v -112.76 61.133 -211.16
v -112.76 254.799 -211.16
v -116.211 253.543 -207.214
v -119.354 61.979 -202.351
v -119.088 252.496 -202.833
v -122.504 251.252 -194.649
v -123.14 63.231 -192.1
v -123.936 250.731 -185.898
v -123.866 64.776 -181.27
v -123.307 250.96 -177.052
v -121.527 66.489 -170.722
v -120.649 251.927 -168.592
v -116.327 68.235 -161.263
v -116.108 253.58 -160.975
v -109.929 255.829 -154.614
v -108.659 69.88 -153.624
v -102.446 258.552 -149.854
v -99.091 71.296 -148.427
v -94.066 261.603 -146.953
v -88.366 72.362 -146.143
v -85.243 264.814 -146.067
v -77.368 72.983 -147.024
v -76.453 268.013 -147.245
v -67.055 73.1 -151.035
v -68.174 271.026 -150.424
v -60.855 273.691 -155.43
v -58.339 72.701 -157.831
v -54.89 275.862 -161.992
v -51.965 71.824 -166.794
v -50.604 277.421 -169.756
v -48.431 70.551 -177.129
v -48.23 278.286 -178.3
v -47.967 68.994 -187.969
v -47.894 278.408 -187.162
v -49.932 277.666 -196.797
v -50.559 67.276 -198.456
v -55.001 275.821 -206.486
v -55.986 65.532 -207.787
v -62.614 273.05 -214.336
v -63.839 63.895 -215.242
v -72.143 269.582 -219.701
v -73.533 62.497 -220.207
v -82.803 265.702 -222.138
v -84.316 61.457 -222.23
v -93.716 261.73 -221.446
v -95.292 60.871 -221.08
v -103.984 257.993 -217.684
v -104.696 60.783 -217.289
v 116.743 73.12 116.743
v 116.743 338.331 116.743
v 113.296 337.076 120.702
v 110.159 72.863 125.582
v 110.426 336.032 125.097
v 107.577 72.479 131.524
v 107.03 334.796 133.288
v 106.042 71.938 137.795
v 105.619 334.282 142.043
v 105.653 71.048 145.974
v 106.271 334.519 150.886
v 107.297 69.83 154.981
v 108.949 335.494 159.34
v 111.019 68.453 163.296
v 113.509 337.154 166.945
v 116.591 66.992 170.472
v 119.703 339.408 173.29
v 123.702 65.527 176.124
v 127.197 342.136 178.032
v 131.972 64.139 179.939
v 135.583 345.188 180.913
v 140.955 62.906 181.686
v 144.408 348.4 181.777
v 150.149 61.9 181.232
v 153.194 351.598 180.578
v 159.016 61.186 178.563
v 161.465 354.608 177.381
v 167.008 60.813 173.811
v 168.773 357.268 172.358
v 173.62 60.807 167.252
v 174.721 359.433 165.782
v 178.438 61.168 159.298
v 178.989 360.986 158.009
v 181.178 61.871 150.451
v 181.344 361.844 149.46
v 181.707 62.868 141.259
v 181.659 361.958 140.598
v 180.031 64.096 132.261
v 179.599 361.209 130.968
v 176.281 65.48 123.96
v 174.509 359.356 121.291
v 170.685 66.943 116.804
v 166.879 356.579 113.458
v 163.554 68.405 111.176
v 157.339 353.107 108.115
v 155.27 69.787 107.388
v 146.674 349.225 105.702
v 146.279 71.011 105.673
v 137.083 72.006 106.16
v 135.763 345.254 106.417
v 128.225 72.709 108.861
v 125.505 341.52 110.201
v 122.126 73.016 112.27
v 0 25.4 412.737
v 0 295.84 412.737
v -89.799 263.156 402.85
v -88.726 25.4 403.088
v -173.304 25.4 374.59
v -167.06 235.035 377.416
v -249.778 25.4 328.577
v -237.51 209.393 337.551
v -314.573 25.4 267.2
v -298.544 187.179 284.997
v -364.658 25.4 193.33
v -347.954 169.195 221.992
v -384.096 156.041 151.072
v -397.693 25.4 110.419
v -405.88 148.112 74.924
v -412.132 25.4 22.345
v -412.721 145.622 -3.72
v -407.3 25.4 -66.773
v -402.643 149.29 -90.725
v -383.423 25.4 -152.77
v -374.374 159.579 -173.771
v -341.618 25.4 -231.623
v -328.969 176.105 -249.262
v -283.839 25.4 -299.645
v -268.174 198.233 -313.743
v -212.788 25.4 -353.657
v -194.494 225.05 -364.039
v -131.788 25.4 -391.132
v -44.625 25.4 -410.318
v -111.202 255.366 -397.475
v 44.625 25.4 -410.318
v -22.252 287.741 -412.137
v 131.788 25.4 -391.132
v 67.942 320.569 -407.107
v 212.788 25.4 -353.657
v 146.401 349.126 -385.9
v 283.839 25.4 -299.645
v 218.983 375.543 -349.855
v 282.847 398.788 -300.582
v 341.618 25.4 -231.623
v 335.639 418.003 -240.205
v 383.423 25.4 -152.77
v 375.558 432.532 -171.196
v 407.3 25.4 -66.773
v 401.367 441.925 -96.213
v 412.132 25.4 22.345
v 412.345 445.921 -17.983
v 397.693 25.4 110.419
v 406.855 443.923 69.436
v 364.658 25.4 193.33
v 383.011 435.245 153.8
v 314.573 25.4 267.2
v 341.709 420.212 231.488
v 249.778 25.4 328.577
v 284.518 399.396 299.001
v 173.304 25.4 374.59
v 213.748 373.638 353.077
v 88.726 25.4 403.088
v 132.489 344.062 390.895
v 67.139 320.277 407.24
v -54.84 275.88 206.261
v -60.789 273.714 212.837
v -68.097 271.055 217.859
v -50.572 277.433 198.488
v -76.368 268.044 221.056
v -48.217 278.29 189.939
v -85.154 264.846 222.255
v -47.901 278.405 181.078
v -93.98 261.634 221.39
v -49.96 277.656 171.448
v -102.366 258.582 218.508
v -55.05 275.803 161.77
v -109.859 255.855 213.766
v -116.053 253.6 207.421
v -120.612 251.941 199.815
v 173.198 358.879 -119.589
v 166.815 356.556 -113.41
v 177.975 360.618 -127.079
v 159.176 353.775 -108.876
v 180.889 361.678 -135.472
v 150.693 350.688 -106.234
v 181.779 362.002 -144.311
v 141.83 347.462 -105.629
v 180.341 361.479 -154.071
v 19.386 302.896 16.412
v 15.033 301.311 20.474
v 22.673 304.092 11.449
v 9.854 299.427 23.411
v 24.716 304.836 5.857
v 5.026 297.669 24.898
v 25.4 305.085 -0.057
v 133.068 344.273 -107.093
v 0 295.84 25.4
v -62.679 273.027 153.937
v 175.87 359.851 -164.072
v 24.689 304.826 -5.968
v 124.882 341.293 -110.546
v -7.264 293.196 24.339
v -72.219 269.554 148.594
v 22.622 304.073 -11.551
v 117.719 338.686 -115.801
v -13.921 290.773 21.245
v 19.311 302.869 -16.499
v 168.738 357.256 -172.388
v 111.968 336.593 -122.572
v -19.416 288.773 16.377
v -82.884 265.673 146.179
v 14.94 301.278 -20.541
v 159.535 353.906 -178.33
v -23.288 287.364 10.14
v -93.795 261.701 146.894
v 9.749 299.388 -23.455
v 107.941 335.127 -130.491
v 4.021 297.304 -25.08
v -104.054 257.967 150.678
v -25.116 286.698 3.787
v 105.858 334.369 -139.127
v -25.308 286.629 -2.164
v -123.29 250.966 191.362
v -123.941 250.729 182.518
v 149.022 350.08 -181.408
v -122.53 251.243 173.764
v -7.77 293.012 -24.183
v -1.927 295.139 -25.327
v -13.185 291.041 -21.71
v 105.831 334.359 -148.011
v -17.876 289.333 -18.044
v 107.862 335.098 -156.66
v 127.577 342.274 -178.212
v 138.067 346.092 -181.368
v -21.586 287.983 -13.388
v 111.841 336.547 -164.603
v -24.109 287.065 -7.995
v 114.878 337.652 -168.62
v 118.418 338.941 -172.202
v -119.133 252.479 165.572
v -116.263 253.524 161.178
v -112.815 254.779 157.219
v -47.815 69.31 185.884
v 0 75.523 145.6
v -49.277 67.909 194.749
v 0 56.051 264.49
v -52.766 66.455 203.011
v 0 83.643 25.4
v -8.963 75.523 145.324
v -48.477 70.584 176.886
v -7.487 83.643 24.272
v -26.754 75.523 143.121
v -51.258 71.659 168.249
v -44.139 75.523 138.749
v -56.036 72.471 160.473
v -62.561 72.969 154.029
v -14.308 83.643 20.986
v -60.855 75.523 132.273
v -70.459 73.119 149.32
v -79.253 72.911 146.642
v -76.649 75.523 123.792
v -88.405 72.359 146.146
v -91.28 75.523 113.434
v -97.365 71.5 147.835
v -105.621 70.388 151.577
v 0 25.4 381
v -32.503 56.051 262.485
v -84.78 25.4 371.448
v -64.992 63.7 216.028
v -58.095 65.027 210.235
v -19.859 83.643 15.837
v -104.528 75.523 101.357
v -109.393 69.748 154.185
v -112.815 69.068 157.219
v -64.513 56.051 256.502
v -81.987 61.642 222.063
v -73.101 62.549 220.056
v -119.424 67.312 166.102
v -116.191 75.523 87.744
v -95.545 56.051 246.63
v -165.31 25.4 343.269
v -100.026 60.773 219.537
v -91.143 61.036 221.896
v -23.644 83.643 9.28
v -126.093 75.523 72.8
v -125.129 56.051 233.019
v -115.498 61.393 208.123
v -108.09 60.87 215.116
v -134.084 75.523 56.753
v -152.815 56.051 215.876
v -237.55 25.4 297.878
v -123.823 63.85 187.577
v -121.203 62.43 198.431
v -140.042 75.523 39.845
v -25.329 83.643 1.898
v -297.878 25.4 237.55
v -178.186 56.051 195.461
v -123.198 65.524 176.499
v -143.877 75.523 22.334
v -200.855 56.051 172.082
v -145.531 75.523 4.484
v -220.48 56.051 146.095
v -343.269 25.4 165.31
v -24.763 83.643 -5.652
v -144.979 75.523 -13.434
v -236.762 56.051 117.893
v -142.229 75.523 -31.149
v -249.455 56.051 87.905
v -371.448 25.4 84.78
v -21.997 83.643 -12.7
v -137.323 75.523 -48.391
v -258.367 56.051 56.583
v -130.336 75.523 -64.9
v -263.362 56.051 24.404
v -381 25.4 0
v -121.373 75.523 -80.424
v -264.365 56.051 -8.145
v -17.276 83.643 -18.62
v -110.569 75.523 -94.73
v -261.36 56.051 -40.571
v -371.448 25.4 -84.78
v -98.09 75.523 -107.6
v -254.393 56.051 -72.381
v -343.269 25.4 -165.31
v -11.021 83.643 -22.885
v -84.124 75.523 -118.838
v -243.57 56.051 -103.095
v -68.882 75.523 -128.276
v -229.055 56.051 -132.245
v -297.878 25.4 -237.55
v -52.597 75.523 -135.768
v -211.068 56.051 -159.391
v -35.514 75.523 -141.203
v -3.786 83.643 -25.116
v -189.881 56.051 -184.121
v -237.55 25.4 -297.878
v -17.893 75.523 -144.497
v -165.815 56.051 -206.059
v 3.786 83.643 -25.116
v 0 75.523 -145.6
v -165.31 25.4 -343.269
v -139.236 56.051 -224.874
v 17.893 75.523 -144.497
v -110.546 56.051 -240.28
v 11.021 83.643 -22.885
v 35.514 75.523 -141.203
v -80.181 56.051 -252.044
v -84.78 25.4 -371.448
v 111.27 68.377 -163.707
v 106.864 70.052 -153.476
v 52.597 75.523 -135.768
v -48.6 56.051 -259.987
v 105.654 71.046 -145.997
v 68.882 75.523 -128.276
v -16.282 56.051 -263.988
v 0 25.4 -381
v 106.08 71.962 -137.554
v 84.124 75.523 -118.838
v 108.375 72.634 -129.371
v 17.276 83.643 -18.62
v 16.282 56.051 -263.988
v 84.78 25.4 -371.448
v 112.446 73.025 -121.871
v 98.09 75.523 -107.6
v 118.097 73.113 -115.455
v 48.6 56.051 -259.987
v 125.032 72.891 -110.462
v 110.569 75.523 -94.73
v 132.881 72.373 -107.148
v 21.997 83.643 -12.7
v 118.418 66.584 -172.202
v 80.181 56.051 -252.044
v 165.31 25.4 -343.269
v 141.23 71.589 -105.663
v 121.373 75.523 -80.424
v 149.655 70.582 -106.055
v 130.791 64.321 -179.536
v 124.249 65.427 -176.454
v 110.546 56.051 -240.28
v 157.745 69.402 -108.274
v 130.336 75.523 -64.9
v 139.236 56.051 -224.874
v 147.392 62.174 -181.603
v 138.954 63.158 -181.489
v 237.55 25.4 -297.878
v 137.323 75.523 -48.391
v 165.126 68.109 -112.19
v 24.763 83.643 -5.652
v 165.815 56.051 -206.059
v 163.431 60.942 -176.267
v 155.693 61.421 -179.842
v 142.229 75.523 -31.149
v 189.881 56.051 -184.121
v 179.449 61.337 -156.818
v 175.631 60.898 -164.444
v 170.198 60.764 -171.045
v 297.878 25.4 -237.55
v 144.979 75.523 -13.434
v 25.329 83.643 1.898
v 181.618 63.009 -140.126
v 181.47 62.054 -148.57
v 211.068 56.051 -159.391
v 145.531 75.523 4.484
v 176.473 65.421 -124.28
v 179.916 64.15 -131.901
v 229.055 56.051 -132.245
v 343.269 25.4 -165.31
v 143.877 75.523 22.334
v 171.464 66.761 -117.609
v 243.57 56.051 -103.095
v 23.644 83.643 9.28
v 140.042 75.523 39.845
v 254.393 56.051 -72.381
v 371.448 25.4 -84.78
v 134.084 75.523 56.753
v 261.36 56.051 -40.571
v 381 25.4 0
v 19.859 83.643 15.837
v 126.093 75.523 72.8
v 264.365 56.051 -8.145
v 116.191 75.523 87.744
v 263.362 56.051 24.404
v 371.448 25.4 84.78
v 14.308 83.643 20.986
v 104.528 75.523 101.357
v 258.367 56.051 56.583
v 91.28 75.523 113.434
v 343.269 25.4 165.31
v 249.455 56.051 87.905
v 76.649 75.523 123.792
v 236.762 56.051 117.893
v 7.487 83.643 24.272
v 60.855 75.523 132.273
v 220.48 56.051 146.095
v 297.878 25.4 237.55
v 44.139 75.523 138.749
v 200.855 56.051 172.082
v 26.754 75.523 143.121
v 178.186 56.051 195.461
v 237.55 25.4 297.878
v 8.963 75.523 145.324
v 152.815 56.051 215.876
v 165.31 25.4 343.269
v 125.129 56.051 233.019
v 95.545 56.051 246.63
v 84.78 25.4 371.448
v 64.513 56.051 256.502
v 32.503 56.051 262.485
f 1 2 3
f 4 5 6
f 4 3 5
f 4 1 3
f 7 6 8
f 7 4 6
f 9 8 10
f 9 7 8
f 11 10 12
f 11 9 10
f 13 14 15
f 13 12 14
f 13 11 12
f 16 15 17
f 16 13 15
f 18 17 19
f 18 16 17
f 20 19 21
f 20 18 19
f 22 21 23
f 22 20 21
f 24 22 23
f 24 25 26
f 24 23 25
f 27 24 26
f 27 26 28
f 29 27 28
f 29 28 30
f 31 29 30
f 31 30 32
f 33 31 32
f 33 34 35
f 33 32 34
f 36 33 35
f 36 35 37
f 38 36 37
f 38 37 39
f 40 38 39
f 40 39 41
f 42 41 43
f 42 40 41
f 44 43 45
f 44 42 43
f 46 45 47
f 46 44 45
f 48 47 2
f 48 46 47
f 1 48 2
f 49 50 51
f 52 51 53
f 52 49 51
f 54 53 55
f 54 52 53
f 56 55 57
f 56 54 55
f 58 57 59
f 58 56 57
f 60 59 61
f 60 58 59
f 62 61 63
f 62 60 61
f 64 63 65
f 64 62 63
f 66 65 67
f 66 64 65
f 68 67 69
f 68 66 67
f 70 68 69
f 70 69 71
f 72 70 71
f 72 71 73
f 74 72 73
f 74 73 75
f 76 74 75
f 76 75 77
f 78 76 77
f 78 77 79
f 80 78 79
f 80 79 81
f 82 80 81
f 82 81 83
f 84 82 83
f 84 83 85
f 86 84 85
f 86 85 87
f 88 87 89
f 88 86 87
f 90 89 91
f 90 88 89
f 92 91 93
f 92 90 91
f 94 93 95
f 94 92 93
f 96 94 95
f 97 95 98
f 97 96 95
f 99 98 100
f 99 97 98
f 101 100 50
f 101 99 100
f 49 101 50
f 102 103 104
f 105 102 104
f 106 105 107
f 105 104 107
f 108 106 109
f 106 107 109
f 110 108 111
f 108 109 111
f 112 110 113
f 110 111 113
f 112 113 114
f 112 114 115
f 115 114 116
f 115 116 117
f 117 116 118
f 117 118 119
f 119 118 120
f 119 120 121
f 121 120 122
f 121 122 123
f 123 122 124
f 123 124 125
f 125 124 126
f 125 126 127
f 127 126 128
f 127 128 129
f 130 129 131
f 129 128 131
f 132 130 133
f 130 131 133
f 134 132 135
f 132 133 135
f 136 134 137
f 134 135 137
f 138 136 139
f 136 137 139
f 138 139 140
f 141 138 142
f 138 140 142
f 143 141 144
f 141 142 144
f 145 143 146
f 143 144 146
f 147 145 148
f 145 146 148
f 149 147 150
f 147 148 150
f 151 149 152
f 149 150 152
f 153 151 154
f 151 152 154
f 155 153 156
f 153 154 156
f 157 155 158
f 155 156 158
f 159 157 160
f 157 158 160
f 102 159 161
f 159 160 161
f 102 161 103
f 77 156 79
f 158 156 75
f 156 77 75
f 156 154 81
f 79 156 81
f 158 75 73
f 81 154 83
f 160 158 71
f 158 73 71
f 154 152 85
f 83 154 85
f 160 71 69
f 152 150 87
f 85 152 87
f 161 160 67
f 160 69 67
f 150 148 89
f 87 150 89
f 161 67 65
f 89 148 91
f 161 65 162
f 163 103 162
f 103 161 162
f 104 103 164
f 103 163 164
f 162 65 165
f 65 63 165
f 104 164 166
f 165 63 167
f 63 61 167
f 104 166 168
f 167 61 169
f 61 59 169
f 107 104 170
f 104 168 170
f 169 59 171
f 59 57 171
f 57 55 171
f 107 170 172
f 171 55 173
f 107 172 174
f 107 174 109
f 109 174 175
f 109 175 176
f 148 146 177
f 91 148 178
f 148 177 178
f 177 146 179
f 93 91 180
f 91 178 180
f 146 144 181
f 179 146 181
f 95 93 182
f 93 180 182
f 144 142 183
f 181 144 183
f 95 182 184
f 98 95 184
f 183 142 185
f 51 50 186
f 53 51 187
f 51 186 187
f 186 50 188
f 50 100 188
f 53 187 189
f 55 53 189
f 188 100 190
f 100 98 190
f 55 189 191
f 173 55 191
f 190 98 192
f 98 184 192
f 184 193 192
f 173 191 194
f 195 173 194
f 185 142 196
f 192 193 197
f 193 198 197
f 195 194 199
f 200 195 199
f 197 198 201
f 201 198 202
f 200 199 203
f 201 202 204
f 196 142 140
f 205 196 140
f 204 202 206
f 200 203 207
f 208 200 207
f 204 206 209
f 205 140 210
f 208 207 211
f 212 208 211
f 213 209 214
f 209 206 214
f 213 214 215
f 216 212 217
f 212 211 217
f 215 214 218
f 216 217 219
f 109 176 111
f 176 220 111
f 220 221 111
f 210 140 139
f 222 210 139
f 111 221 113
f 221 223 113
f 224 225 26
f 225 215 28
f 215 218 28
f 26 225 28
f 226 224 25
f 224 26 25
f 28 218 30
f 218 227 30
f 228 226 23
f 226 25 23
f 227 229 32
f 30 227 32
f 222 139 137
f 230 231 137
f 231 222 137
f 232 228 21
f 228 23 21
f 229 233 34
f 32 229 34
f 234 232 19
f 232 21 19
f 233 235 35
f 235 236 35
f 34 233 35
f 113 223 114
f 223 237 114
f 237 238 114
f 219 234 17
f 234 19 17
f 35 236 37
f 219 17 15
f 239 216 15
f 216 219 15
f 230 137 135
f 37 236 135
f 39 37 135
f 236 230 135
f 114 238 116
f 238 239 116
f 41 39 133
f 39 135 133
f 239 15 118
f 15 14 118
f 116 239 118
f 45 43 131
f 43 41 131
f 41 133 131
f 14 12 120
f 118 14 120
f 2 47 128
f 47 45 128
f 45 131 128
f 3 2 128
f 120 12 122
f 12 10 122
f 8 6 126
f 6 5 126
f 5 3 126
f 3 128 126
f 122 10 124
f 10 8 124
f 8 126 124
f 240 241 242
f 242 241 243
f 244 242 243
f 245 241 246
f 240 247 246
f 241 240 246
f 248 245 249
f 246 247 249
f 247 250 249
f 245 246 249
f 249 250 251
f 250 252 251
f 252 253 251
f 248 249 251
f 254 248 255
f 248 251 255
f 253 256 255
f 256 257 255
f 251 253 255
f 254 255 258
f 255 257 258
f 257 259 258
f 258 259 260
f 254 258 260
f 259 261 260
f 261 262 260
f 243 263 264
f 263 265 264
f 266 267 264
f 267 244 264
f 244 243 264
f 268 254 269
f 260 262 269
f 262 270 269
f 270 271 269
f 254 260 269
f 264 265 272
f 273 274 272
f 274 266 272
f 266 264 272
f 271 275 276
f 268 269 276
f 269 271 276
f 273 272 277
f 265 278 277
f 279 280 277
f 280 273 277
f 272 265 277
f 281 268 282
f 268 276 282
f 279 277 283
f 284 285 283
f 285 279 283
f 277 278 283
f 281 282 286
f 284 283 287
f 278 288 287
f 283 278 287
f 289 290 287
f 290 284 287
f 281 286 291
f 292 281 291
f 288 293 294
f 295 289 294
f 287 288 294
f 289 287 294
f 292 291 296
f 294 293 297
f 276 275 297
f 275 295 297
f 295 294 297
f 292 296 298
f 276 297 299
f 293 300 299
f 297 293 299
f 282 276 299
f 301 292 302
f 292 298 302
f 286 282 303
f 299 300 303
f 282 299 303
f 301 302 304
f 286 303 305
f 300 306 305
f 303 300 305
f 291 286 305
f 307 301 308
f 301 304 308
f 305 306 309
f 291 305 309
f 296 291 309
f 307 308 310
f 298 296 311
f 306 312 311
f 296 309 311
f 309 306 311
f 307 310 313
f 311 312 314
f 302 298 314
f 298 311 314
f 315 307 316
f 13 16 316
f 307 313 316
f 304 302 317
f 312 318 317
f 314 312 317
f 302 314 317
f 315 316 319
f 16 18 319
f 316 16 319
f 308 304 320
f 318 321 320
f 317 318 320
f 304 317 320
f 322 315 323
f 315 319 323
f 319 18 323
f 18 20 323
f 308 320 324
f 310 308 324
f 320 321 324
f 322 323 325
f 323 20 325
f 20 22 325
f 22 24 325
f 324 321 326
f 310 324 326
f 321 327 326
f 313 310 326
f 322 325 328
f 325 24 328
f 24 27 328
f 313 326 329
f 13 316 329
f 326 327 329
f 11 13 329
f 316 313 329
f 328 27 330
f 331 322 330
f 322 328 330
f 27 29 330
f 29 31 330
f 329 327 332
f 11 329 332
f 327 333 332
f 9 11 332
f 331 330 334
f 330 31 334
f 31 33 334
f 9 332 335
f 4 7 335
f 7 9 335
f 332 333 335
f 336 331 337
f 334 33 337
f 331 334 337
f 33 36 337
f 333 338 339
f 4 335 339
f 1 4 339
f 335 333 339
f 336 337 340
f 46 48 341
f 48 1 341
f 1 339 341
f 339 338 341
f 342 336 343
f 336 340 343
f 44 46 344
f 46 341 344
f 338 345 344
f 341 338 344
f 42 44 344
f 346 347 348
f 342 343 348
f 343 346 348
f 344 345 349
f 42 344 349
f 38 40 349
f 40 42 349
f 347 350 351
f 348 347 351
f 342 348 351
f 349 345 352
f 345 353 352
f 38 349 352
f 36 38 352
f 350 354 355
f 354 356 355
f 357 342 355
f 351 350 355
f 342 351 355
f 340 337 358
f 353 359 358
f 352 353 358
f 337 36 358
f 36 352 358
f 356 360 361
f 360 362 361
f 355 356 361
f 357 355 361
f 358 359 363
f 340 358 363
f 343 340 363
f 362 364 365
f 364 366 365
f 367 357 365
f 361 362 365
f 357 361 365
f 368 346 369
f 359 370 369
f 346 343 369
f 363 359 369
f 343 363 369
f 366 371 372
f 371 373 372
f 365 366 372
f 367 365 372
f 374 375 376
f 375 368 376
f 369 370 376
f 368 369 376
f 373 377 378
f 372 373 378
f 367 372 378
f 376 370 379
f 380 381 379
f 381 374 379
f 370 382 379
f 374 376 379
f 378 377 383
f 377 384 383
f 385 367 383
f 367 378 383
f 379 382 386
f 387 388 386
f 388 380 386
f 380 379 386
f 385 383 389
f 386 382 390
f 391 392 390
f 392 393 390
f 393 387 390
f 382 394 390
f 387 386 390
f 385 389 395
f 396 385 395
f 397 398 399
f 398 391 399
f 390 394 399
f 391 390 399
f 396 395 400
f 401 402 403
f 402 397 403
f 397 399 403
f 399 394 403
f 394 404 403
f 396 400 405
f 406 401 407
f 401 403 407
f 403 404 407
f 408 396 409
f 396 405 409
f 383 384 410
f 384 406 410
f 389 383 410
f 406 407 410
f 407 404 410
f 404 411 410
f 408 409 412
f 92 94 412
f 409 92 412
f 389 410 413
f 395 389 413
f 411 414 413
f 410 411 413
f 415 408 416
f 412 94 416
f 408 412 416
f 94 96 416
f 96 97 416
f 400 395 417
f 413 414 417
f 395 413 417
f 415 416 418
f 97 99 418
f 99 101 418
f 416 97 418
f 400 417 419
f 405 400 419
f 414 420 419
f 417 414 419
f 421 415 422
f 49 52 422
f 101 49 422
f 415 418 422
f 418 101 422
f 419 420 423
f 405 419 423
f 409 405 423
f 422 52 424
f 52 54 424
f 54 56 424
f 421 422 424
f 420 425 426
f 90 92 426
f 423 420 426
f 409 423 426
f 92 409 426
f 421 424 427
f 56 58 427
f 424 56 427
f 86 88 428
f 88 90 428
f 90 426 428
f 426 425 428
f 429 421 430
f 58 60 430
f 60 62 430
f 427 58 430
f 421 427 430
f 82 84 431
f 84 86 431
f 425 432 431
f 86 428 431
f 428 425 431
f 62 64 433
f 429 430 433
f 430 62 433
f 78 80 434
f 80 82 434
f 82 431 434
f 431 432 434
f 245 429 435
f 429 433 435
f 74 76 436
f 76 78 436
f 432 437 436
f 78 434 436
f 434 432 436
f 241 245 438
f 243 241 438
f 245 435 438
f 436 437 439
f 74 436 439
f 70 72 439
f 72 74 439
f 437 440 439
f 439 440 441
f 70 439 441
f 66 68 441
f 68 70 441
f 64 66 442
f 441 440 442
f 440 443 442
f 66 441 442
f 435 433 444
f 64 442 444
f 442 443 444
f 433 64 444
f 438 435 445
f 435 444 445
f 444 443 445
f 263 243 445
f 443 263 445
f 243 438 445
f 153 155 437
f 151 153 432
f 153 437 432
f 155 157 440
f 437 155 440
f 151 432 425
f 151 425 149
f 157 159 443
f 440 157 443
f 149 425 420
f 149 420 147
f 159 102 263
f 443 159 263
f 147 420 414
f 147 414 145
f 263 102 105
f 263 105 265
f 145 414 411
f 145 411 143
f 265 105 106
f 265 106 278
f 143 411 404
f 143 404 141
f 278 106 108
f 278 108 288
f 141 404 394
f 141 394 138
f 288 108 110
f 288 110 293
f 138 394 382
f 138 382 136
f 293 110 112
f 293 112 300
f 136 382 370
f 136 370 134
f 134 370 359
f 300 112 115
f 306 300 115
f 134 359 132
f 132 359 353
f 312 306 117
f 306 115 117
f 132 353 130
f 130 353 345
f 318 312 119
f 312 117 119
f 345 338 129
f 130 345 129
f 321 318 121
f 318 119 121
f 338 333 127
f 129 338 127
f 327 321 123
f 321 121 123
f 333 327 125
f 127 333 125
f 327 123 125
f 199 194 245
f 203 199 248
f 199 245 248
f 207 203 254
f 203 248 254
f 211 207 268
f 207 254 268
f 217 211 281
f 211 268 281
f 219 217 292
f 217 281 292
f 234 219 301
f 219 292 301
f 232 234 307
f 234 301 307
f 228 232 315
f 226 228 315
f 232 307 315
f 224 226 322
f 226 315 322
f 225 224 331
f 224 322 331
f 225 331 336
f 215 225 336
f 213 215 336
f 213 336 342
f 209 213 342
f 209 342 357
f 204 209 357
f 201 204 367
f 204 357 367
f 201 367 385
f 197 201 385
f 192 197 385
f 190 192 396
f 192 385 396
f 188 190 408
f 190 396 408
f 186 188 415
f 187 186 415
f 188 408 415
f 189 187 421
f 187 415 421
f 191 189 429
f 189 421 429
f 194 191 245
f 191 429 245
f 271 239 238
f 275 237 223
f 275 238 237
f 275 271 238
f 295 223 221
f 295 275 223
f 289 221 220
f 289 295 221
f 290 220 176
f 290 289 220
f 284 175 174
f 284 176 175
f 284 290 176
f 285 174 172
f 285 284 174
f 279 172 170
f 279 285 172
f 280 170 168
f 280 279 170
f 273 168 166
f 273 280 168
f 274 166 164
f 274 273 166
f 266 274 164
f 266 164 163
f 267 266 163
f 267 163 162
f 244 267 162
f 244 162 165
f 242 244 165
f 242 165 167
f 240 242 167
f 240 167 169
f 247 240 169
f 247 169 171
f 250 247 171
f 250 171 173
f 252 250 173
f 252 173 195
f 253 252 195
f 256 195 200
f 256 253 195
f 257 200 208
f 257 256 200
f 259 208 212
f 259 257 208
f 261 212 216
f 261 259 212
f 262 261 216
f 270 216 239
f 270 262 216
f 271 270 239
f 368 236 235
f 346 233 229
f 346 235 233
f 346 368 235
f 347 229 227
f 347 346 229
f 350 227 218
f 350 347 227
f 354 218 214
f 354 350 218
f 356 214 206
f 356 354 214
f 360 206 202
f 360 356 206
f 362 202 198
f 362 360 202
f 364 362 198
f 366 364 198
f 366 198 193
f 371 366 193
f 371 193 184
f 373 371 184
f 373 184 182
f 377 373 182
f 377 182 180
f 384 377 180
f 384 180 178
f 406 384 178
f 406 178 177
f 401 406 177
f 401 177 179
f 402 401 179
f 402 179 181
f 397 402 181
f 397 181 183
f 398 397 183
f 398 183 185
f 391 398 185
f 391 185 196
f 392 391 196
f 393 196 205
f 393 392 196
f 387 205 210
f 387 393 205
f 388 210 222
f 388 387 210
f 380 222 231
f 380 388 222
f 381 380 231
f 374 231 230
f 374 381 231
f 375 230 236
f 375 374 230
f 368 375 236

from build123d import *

# Parameters (mm, degrees)
CUT_EXTRUDE1_DEPTH      = 874.621652083
CUT_EXTRUDE1_DEPTH_BACK = 874.621652083
SKETCH6_R               = 38.1
SKETCH9_W               = 1605.930086896
SKETCH9_H               = 1331.723127606
CUT_EXTRUDE8_DEPTH      = 762.168569892


with BuildPart() as part:
    # Sketch4 → Revolve3 (revolve)
    with BuildSketch(Plane.XY):
        with BuildLine():
            Line((25.4, 650.00817936), (25.4, 83.643188795))
            ThreePointArc((25.4, 83.643188795), (205.276173143, 67.197534451), (381, 25.4))
            Line((381, 25.4), (412.7373, 25.4))
            Line((412.7373, 25.4), (412.7373, 488.95))
            Line((412.7373, 488.95), (411.1498, 488.95))
            Line((411.1498, 488.95), (411.1498, 514.35))
            ThreePointArc((411.1498, 514.35), (404.683813004, 537.626492136), (387.141395745, 554.23575674))
            ThreePointArc((387.141395745, 554.23575674), (211.762891066, 622.866495309), (25.4, 650.00817936))
        make_face()
    revolve(axis=Axis((0, 588.703209944, 0), (0, -1, 0)))

    # Sketch6 → Cut-Extrude1 (cut, two sides: drawn at the far end of the back side and taken through both)
    with BuildSketch(Plane(origin=(0, 0, 0), x_dir=(1, 0, 0), z_dir=(0, 1, 0)).offset(-CUT_EXTRUDE1_DEPTH_BACK)):
        with Locations((143.684097937, 143.684097937)):
            Circle(SKETCH6_R)
        with Locations((-85.876030786, 184.161742326)):
            Circle(SKETCH6_R)
        with Locations((-85.876030786, -184.161742326)):
            Circle(SKETCH6_R)
        with Locations((143.684097937, -143.684097937)):
            Circle(SKETCH6_R)
    extrude(amount=CUT_EXTRUDE1_DEPTH + CUT_EXTRUDE1_DEPTH_BACK, mode=Mode.SUBTRACT)

    # Sketch9 → Cut-Extrude8 (cut, through all)
    with BuildSketch(Plane(origin=(-95.081116315, 261.233220092, 0), x_dir=(-0.9396926207859104, -0.34202014332566316, 0), z_dir=(0.34202014332566316, -0.9396926207859104, 0))):
        Rectangle(SKETCH9_W, SKETCH9_H)
    extrude(amount=-CUT_EXTRUDE8_DEPTH, mode=Mode.SUBTRACT)


solid = part.part
